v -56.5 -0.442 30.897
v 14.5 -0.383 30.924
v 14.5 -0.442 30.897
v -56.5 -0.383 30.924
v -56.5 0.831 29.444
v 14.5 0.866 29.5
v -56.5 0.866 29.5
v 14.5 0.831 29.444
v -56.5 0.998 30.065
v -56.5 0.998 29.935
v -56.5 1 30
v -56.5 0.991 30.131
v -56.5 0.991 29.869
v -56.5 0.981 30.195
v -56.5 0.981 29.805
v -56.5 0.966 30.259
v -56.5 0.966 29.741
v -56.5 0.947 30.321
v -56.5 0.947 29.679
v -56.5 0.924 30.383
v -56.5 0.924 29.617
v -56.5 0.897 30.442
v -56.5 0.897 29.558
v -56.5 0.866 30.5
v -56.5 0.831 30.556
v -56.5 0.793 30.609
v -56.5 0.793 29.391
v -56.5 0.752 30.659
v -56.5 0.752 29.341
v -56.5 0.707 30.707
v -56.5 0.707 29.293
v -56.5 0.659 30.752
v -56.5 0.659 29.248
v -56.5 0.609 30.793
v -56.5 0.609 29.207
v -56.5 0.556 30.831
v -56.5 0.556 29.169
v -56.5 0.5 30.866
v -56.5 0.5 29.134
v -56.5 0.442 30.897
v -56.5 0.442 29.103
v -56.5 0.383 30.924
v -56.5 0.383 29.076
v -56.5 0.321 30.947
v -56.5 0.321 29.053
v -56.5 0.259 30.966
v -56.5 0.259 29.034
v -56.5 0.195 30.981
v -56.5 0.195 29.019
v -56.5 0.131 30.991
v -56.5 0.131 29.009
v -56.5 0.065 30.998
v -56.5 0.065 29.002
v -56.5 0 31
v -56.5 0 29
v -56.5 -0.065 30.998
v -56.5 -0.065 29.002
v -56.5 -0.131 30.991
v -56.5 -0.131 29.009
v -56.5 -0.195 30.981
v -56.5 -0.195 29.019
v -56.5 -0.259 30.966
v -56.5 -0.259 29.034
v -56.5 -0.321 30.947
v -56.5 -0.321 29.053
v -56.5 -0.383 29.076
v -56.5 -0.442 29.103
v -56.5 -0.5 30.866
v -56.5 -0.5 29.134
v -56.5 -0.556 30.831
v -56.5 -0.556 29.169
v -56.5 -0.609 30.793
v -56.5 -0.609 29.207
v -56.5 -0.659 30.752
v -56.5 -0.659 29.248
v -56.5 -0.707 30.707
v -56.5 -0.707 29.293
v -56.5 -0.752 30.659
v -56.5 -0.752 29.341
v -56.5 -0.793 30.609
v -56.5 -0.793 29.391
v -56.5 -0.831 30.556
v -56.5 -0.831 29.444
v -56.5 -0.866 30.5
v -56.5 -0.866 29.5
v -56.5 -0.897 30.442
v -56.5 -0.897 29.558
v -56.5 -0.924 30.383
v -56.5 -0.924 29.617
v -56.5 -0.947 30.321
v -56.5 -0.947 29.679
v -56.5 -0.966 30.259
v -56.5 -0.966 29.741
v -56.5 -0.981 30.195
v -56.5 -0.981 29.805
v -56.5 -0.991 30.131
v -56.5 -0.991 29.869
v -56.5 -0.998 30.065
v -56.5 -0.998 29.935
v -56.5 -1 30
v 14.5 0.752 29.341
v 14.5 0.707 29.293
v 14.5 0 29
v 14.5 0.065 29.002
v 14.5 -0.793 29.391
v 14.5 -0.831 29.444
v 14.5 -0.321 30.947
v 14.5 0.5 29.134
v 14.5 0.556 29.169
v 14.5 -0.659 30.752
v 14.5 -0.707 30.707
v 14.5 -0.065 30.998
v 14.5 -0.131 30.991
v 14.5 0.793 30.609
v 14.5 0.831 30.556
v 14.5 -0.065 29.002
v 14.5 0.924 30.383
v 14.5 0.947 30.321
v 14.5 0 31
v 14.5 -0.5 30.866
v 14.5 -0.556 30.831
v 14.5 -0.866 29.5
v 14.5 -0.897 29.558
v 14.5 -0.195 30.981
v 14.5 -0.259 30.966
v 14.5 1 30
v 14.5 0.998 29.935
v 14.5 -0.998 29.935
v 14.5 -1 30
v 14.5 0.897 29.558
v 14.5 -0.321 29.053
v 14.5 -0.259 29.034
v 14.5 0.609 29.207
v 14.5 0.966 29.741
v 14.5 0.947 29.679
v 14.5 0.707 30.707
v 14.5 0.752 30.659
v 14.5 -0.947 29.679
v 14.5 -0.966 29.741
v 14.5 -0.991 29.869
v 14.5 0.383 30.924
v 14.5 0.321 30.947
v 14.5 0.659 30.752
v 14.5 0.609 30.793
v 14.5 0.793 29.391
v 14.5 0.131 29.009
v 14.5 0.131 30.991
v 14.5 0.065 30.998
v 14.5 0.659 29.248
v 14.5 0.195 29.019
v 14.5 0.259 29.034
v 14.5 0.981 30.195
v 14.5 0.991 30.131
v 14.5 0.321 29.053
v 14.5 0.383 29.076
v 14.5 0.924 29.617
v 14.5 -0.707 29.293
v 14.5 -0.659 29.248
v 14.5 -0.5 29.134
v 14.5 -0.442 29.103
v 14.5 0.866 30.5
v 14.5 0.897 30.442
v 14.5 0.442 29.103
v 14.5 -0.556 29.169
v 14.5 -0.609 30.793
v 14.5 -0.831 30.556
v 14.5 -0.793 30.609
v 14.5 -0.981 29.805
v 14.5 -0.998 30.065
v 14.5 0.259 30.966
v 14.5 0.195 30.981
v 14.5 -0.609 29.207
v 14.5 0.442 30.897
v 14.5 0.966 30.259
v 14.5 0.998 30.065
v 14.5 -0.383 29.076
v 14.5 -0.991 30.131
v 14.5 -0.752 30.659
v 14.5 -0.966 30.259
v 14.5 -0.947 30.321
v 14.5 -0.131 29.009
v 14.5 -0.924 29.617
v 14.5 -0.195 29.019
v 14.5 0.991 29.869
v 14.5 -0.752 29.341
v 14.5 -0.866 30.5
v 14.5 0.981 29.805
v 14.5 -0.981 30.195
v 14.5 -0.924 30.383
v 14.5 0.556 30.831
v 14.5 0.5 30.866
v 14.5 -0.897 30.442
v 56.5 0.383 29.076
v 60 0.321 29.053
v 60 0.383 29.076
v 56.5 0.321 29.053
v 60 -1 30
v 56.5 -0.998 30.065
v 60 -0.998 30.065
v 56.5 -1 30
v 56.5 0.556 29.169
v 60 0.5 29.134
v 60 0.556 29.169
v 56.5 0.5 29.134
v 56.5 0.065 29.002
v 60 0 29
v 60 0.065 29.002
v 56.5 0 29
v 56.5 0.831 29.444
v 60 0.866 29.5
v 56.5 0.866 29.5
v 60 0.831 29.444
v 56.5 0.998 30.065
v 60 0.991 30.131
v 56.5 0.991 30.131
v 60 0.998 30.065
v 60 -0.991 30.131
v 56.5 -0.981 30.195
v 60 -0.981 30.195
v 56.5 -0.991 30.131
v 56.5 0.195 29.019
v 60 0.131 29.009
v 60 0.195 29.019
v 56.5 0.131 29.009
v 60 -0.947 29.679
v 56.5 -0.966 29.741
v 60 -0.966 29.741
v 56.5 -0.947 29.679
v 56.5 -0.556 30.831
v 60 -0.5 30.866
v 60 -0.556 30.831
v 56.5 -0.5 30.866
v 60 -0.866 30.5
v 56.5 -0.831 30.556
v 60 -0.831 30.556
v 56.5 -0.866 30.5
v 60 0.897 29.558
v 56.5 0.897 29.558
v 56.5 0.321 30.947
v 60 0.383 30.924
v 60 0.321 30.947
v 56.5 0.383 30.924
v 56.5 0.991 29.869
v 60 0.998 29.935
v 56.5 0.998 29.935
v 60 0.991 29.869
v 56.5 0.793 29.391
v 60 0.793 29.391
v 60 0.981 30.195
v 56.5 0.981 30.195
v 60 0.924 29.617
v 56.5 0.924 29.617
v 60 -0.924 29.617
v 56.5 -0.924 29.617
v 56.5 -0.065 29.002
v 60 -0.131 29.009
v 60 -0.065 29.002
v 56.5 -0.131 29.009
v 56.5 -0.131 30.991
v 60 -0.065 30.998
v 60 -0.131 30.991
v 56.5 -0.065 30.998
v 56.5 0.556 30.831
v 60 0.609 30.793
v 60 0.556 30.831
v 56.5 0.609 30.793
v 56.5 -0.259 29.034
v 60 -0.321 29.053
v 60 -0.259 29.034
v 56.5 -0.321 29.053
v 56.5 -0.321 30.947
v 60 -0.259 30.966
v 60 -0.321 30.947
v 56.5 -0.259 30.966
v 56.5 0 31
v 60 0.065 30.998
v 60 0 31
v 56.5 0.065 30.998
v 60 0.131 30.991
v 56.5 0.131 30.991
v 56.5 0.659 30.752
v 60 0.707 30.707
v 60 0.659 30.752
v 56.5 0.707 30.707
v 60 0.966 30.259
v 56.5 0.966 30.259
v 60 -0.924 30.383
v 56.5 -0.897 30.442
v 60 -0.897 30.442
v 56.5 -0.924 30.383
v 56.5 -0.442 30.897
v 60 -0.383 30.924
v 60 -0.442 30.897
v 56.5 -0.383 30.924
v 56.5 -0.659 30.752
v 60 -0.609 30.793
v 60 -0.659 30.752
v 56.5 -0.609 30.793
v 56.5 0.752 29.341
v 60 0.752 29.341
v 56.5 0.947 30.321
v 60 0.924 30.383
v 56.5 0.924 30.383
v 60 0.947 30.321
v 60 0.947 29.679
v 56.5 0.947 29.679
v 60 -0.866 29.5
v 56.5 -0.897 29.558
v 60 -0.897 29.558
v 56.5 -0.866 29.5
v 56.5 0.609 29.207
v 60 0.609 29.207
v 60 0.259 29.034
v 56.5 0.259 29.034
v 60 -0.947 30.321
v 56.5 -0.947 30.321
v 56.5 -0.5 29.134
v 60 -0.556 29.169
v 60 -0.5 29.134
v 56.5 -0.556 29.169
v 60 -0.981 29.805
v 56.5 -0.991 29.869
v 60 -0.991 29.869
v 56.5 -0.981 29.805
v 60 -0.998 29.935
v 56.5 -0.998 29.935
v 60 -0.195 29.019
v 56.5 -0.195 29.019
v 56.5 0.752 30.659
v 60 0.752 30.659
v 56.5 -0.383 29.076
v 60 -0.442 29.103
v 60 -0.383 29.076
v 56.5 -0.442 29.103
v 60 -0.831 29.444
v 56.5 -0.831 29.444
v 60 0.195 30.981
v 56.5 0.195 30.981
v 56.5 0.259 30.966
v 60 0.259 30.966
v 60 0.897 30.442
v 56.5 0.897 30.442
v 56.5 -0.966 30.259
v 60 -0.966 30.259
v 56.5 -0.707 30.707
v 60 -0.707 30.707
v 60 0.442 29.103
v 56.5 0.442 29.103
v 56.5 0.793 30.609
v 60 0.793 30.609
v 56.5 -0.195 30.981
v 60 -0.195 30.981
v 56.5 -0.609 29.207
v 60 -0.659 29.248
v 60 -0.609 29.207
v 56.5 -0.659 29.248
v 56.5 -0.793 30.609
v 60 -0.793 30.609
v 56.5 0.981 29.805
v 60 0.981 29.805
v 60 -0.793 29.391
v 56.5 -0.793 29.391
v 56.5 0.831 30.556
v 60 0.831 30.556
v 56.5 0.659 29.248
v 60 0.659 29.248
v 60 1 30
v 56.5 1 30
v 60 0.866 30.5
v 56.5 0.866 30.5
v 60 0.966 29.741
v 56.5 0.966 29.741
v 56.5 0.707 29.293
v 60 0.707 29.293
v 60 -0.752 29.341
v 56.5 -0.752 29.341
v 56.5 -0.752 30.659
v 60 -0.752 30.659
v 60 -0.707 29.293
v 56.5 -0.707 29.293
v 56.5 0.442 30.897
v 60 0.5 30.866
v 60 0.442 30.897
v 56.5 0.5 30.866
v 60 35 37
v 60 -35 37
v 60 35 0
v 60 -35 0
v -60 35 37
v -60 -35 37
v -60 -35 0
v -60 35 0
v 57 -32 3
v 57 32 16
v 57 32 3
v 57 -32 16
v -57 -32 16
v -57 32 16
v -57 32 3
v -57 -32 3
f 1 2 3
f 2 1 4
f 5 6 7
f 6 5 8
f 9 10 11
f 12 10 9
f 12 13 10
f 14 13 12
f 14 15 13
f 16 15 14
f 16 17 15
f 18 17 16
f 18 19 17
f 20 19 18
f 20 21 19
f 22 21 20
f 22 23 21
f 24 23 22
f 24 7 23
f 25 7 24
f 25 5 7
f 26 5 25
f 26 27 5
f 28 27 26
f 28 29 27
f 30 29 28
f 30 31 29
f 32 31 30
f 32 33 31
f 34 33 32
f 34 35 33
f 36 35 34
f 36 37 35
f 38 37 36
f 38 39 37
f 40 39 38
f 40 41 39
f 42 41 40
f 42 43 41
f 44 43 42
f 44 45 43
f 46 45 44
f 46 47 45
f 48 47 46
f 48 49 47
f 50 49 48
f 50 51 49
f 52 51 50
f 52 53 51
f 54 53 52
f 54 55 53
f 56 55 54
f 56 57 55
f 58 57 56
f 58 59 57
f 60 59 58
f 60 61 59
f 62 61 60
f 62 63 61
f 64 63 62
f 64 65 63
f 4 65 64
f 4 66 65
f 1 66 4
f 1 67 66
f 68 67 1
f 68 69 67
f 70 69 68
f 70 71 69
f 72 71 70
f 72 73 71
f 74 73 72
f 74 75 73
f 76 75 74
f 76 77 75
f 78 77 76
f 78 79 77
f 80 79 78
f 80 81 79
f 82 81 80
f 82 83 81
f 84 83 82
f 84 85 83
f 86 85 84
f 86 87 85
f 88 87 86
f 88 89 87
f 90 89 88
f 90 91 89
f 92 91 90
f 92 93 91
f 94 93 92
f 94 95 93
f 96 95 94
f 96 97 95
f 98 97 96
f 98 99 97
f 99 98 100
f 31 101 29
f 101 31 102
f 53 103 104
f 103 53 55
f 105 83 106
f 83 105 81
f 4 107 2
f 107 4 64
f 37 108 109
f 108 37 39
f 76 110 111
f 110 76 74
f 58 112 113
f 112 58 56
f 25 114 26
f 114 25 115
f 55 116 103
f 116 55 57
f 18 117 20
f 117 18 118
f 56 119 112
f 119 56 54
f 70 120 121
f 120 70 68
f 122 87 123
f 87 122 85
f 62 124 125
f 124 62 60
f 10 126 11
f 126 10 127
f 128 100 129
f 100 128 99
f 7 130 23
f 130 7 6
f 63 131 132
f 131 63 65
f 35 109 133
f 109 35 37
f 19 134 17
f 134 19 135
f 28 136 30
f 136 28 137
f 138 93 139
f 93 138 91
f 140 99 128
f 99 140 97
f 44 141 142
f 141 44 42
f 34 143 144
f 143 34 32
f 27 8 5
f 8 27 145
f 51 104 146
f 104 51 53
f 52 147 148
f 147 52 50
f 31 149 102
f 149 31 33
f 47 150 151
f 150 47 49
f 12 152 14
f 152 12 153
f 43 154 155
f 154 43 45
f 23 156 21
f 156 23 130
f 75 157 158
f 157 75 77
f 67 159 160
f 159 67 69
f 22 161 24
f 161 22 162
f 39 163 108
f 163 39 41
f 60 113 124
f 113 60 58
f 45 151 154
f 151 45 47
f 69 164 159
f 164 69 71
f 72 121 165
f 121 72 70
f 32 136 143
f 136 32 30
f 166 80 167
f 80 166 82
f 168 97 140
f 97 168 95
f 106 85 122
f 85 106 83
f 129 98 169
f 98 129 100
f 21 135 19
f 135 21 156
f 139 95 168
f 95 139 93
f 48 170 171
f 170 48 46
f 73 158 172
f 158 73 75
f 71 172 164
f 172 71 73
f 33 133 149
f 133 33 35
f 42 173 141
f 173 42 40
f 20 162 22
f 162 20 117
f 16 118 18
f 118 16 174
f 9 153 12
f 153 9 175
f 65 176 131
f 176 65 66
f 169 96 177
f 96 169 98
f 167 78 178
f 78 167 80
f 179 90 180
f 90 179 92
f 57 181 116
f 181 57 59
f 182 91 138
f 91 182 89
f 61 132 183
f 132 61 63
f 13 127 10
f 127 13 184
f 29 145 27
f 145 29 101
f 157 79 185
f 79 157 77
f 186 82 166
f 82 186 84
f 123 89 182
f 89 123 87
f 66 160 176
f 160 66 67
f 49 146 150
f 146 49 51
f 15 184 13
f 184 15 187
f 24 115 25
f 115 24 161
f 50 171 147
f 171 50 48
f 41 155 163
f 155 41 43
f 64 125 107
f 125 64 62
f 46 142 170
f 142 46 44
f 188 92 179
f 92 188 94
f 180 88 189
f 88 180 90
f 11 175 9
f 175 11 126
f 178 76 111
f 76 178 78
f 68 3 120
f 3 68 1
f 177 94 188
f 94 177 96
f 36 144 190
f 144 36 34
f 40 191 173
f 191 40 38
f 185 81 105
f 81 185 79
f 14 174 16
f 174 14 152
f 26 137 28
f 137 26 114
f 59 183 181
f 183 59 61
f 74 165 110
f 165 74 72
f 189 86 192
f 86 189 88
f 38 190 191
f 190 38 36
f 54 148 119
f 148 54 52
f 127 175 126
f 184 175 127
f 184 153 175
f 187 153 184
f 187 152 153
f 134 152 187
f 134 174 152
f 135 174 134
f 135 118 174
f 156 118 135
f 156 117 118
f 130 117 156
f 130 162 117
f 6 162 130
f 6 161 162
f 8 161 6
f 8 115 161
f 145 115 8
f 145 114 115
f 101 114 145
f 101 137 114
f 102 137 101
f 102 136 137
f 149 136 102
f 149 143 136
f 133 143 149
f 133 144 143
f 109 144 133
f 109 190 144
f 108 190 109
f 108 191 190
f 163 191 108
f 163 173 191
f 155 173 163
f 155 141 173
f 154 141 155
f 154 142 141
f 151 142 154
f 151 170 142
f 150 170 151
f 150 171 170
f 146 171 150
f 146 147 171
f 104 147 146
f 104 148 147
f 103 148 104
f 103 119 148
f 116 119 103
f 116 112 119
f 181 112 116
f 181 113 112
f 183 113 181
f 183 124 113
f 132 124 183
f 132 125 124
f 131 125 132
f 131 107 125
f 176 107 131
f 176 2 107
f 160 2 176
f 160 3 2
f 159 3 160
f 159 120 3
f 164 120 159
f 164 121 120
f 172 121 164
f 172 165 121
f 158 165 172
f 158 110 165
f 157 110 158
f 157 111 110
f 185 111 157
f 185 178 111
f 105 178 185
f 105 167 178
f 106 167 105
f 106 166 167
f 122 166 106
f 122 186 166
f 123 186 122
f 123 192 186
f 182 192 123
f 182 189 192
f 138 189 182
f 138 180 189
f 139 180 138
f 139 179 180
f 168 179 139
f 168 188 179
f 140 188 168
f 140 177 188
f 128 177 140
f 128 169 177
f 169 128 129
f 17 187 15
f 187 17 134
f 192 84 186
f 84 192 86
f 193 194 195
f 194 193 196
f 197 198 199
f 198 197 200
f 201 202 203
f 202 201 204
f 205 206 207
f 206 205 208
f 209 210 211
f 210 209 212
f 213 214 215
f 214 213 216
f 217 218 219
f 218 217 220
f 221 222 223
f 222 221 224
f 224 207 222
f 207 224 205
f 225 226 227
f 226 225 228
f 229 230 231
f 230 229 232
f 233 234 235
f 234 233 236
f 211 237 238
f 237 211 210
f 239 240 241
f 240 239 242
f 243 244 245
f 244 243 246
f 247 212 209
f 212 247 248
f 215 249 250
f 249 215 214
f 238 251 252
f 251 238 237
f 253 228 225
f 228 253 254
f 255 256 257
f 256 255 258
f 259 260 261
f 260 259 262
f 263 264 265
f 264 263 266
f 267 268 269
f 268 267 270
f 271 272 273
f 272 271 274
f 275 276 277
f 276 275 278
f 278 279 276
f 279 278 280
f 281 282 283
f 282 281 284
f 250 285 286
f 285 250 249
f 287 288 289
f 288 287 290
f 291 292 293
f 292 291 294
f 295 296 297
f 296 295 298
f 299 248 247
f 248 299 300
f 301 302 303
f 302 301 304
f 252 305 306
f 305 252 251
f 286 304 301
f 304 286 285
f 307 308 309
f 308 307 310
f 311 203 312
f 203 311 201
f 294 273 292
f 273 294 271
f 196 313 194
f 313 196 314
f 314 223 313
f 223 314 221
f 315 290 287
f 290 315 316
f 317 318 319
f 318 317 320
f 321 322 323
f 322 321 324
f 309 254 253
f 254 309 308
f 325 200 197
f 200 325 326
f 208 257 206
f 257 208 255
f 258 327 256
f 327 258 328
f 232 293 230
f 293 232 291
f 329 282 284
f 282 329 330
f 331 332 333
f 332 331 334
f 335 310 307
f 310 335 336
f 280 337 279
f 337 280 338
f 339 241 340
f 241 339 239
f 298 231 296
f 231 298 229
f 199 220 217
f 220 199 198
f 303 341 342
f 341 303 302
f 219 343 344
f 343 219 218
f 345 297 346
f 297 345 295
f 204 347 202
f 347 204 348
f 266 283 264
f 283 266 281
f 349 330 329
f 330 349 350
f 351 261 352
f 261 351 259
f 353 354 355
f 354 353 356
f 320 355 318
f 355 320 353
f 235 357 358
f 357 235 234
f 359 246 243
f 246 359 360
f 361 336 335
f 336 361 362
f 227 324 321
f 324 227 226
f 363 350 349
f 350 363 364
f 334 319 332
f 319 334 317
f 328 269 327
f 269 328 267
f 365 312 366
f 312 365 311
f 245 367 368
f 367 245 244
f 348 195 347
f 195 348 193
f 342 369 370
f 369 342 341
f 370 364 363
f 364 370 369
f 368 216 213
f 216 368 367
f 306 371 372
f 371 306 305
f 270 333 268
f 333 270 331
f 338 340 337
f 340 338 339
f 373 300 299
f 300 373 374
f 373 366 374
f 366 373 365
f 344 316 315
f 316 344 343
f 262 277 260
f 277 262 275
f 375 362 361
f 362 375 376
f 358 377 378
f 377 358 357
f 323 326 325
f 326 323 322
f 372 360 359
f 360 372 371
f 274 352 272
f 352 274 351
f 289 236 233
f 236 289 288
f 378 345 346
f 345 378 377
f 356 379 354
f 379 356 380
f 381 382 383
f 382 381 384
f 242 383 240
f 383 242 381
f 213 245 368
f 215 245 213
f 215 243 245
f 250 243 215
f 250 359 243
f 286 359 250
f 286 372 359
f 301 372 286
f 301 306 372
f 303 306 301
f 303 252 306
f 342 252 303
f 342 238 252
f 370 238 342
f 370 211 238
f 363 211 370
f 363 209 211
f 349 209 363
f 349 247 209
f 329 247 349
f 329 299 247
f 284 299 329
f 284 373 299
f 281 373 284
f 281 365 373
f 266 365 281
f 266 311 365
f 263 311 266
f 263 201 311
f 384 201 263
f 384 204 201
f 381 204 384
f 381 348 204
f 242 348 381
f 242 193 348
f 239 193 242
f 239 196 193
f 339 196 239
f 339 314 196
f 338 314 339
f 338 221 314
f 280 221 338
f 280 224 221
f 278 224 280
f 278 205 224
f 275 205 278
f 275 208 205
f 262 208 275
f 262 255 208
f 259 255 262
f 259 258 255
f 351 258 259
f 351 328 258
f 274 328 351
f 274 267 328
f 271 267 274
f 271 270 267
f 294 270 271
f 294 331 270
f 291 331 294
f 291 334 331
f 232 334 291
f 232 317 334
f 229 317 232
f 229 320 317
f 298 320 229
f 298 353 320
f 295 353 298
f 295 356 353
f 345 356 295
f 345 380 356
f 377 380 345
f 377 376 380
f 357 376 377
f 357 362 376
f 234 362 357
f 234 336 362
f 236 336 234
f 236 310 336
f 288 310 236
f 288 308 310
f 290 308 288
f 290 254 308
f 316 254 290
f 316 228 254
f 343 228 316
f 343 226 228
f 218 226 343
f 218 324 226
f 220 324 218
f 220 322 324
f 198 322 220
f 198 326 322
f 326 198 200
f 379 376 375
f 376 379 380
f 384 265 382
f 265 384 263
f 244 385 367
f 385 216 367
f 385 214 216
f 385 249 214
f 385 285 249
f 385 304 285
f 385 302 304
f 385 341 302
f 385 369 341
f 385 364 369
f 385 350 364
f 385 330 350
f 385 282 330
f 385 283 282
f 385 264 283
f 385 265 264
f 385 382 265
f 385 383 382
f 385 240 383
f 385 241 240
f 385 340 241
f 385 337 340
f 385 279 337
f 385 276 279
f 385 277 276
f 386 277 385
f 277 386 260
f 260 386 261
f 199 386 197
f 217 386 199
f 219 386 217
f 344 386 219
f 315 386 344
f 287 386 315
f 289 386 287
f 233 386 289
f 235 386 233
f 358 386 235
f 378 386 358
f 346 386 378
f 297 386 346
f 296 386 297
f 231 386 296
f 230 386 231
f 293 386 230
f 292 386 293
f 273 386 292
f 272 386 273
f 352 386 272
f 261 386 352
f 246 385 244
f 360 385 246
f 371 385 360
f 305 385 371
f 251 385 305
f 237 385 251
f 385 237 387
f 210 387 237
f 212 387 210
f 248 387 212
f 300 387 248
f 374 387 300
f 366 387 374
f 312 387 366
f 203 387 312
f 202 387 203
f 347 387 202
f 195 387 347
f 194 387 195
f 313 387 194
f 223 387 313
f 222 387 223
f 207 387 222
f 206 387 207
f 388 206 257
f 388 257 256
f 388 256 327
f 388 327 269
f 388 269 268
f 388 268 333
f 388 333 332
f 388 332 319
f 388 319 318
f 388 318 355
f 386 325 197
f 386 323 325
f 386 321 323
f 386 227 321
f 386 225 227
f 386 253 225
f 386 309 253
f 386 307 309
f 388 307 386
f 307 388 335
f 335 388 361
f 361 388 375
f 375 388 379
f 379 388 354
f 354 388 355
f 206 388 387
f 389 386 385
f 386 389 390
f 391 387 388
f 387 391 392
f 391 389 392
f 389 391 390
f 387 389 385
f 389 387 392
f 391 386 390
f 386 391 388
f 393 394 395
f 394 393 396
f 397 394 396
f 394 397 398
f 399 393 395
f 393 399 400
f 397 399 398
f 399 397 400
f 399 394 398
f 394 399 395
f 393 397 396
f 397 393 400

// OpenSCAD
// Mini horizontal gel-electrophoresis buffer tank
// Print orientation: tank rests on XY plane at z = 0, builds upward (+Z)

// ---------------- Parameters ----------------
tank_x      = 120;   // outer length in X (mm)
tank_y      = 70;    // outer width in Y (mm)
tank_z      = 40;    // outer height in Z (mm)
wall        = 3;     // wall thickness (mm)
floor       = 3;     // floor thickness (mm)

platform_x  = 60;    // platform length in X (mm), centred
platform_z  = 10;    // platform height above inner floor (mm) -> top at z = 13

hole_d      = 2;     // electrode hole diameter (mm)
hole_y      = 0;     // hole centre Y (mm)
hole_z      = 30;    // hole centre Z (mm)

eps         = 0.5;   // cutter overshoot past faces (mm)
$fn         = 96;    // curve resolution

// ---------------- Derived ----------------
inner_x = tank_x - 2 * wall;   // 114 mm
inner_y = tank_y - 2 * wall;   // 64 mm
inner_z = tank_z - floor;      // 37 mm (floor sits at z = 0..3)

// ---------------- Model ----------------
difference() {
    // Tank body (open top)
    translate([-tank_x / 2, -tank_y / 2, 0])
        cube([tank_x, tank_y, tank_z - wall]);

    // Raised gel-tray platform, full inner width, centred in X
    translate([-inner_x / 2, -inner_y / 2, floor])
        cube([inner_x, inner_y, floor + platform_z]);

    // Horizontal electrode holes through each end wall along X
    for (sx = [-1, 1])
        translate([sx * (inner_x / 2 - eps), hole_y, hole_z])
            rotate([0, 90, 0])
                cylinder(d = hole_d, h = tank_y + 2 * eps);
}
